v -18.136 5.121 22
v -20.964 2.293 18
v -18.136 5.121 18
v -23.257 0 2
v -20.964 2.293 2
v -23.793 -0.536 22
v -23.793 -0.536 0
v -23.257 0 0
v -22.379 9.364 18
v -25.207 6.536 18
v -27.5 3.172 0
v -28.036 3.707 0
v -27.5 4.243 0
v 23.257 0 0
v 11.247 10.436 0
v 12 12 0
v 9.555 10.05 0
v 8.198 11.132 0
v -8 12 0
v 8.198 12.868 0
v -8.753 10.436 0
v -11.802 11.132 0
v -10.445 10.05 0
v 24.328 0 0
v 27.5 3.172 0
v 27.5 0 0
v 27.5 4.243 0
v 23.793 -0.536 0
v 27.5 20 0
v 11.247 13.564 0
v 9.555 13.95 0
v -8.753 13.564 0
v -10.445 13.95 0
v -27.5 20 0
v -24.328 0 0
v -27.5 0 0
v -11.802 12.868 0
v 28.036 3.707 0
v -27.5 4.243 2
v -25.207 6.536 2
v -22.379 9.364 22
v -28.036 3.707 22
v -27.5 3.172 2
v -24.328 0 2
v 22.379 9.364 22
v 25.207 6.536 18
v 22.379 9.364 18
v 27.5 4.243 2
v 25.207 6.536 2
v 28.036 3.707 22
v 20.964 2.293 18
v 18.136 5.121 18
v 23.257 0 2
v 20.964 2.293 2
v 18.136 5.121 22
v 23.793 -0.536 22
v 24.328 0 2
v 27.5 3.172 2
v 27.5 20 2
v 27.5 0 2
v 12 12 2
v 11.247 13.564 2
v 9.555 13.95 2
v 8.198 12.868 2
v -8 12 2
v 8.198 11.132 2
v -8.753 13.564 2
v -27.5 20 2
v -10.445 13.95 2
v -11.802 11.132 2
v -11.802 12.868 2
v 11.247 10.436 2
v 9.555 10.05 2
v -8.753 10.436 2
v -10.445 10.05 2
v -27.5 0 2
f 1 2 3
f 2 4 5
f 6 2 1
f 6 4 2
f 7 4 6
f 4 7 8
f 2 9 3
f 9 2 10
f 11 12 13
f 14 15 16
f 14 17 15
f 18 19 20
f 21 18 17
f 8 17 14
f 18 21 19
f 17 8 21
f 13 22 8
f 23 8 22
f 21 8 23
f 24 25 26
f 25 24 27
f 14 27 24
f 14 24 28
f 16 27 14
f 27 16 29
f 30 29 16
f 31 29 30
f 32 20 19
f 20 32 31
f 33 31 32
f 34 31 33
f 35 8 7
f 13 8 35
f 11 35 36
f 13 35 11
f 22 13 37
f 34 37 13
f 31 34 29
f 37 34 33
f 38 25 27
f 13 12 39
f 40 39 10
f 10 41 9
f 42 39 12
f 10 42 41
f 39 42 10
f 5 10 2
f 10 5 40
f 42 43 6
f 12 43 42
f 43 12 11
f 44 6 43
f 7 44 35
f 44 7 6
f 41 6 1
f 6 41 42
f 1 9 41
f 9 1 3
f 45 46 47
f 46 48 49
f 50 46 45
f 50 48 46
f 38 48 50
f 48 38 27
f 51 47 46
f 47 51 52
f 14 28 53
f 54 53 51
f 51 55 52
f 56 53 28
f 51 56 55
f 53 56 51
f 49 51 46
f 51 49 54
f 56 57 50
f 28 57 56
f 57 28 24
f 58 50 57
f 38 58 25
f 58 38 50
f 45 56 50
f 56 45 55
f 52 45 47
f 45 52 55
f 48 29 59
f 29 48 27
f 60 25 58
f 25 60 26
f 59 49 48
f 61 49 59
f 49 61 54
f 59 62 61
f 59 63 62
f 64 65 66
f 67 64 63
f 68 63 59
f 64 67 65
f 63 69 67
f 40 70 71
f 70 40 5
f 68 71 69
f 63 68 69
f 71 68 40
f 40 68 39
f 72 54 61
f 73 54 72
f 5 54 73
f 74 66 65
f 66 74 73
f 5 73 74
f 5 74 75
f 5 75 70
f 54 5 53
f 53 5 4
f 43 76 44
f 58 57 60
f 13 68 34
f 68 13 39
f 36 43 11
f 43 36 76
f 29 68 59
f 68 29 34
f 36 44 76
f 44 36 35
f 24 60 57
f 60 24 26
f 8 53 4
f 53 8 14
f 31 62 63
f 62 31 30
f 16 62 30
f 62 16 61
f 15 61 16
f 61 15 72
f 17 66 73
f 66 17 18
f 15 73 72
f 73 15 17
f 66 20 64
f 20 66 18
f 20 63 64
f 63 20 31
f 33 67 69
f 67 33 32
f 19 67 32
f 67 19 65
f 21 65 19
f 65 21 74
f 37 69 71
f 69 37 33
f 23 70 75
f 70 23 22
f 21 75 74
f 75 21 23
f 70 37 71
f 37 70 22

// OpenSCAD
width = 55;
depth = 20;
height = 2;
hookDist = width - 6;
hole = 2;

module hook() {
    hookWidth = 6;
    hookDepth = 4;
    hookHeight = 18;
    overHang = 4;
    overHangHeigt = 4;
    
    translate([-hookWidth / 2, - hookDepth / 2, 0]) {
        cube([hookWidth, hookDepth, hookHeight]);
    }
    translate([-hookWidth / 2, -hookDepth / 2, hookHeight]) {
        cube([hookWidth, hookDepth + overHang, overHangHeigt]);
    }
}


difference() {
    union(){    
        translate([-width / 2, 0, 0]) {
            cube([width, depth, height]);
        }

        translate([-hookDist / 2, 3, 0]) {
            rotate([0, 0, -45]) {
                hook();
            }
        }

        translate([hookDist / 2, 3, 0]) {
            rotate([0, 0, 45]) {
                hook();
            }
        }
    }
    
    translate([10, 12, -1]) cylinder(height + 2, hole, hole);
    translate([-10, 12, -1]) cylinder(height + 2, hole, hole);
}
